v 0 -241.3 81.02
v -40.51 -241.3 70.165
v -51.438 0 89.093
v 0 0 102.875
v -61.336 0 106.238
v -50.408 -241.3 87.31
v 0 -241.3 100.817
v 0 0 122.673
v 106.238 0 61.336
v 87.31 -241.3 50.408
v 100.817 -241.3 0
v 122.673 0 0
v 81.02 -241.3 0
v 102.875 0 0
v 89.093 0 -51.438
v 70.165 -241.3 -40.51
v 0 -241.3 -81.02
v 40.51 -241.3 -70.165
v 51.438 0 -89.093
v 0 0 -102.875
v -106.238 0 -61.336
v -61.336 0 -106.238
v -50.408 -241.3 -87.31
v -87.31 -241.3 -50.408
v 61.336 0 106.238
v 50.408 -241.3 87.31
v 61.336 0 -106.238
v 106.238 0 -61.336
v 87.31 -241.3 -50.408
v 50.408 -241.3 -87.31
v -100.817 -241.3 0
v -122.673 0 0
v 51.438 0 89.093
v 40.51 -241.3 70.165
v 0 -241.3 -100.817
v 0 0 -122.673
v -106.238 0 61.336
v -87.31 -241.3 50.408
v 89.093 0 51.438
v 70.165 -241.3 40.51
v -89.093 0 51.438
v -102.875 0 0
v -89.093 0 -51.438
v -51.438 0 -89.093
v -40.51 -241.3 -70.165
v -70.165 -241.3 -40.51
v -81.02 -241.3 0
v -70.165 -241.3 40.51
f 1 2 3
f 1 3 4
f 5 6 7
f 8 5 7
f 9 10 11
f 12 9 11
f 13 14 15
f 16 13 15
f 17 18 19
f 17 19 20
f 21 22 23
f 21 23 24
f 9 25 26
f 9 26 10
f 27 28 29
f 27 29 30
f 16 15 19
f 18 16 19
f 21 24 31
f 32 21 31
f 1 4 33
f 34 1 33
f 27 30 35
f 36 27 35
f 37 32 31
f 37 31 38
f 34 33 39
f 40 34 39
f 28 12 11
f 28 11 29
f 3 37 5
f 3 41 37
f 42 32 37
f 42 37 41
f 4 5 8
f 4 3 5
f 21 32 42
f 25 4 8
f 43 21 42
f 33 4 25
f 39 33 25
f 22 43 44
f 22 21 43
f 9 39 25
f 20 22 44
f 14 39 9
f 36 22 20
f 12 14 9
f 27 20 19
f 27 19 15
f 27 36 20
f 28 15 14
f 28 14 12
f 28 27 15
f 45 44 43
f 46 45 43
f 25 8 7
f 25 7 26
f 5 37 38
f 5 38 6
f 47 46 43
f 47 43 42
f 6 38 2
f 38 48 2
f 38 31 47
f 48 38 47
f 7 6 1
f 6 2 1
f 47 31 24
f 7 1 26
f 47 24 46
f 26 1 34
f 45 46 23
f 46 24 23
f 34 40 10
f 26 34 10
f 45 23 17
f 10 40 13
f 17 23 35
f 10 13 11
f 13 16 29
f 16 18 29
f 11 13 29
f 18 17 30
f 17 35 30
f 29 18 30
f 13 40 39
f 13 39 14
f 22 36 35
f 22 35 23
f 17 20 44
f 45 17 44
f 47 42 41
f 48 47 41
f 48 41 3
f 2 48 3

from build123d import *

# Parameters (mm, degrees)
BOSS_EXTRUDE1_DEPTH = 241.3
BOSS_EXTRUDE1_DRAFT = -5
SHELL1_T            = -19.05


with BuildPart() as part:
    # Sketch1 → Boss-Extrude1 (with draft: the straight prism first)
    with BuildSketch(Plane(origin=(0, 0, 0), x_dir=(1, 0, 0), z_dir=(0, 1, 0))):
        Polygon((122.672579939, 0), (106.237570575, 61.336289969), (61.336289969, 106.237570575), (0, 122.672579939), (-61.336289969, 106.237570575), (-106.237570575, 61.336289969), (-122.672579939, 0), (-106.237570575, -61.336289969), (-61.336289969, -106.237570575), (0, -122.672579939), (61.336289969, -106.237570575), (106.237570575, -61.336289969), align=None)
    extrude(amount=-BOSS_EXTRUDE1_DEPTH)
    # Boss-Extrude1: the draft: its side faces are tilted about the plane it starts from
    boss_extrude1_sides = [part.faces().sort_by_distance(p)[0] for p in [
        (114.455075257, -120.65, -30.668144985),
        (83.786930272, -120.65, -83.786930272),
        (30.668144985, -120.65, -114.455075257),
        (-30.668144985, -120.65, -114.455075257),
        (-83.786930272, -120.65, -83.786930272),
        (-114.455075257, -120.65, -30.668144985),
        (-114.455075257, -120.65, 30.668144985),
        (-83.786930272, -120.65, 83.786930272),
        (-30.668144985, -120.65, 114.455075257),
        (30.668144985, -120.65, 114.455075257),
        (83.786930272, -120.65, 83.786930272),
        (114.455075257, -120.65, 30.668144985),
    ]]
    draft(boss_extrude1_sides, Plane(origin=(0, 0, 0), x_dir=(1, 0, 0), z_dir=(0, 1, 0)), BOSS_EXTRUDE1_DRAFT)

    # Shell1
    shell1_openings = [part.faces().sort_by_distance(p)[0] for p in [
        (0, -241.3, 0),
        (0, 0, 0),
    ]]
    offset(amount=SHELL1_T, openings=shell1_openings, kind=Kind.INTERSECTION)


solid = part.part
